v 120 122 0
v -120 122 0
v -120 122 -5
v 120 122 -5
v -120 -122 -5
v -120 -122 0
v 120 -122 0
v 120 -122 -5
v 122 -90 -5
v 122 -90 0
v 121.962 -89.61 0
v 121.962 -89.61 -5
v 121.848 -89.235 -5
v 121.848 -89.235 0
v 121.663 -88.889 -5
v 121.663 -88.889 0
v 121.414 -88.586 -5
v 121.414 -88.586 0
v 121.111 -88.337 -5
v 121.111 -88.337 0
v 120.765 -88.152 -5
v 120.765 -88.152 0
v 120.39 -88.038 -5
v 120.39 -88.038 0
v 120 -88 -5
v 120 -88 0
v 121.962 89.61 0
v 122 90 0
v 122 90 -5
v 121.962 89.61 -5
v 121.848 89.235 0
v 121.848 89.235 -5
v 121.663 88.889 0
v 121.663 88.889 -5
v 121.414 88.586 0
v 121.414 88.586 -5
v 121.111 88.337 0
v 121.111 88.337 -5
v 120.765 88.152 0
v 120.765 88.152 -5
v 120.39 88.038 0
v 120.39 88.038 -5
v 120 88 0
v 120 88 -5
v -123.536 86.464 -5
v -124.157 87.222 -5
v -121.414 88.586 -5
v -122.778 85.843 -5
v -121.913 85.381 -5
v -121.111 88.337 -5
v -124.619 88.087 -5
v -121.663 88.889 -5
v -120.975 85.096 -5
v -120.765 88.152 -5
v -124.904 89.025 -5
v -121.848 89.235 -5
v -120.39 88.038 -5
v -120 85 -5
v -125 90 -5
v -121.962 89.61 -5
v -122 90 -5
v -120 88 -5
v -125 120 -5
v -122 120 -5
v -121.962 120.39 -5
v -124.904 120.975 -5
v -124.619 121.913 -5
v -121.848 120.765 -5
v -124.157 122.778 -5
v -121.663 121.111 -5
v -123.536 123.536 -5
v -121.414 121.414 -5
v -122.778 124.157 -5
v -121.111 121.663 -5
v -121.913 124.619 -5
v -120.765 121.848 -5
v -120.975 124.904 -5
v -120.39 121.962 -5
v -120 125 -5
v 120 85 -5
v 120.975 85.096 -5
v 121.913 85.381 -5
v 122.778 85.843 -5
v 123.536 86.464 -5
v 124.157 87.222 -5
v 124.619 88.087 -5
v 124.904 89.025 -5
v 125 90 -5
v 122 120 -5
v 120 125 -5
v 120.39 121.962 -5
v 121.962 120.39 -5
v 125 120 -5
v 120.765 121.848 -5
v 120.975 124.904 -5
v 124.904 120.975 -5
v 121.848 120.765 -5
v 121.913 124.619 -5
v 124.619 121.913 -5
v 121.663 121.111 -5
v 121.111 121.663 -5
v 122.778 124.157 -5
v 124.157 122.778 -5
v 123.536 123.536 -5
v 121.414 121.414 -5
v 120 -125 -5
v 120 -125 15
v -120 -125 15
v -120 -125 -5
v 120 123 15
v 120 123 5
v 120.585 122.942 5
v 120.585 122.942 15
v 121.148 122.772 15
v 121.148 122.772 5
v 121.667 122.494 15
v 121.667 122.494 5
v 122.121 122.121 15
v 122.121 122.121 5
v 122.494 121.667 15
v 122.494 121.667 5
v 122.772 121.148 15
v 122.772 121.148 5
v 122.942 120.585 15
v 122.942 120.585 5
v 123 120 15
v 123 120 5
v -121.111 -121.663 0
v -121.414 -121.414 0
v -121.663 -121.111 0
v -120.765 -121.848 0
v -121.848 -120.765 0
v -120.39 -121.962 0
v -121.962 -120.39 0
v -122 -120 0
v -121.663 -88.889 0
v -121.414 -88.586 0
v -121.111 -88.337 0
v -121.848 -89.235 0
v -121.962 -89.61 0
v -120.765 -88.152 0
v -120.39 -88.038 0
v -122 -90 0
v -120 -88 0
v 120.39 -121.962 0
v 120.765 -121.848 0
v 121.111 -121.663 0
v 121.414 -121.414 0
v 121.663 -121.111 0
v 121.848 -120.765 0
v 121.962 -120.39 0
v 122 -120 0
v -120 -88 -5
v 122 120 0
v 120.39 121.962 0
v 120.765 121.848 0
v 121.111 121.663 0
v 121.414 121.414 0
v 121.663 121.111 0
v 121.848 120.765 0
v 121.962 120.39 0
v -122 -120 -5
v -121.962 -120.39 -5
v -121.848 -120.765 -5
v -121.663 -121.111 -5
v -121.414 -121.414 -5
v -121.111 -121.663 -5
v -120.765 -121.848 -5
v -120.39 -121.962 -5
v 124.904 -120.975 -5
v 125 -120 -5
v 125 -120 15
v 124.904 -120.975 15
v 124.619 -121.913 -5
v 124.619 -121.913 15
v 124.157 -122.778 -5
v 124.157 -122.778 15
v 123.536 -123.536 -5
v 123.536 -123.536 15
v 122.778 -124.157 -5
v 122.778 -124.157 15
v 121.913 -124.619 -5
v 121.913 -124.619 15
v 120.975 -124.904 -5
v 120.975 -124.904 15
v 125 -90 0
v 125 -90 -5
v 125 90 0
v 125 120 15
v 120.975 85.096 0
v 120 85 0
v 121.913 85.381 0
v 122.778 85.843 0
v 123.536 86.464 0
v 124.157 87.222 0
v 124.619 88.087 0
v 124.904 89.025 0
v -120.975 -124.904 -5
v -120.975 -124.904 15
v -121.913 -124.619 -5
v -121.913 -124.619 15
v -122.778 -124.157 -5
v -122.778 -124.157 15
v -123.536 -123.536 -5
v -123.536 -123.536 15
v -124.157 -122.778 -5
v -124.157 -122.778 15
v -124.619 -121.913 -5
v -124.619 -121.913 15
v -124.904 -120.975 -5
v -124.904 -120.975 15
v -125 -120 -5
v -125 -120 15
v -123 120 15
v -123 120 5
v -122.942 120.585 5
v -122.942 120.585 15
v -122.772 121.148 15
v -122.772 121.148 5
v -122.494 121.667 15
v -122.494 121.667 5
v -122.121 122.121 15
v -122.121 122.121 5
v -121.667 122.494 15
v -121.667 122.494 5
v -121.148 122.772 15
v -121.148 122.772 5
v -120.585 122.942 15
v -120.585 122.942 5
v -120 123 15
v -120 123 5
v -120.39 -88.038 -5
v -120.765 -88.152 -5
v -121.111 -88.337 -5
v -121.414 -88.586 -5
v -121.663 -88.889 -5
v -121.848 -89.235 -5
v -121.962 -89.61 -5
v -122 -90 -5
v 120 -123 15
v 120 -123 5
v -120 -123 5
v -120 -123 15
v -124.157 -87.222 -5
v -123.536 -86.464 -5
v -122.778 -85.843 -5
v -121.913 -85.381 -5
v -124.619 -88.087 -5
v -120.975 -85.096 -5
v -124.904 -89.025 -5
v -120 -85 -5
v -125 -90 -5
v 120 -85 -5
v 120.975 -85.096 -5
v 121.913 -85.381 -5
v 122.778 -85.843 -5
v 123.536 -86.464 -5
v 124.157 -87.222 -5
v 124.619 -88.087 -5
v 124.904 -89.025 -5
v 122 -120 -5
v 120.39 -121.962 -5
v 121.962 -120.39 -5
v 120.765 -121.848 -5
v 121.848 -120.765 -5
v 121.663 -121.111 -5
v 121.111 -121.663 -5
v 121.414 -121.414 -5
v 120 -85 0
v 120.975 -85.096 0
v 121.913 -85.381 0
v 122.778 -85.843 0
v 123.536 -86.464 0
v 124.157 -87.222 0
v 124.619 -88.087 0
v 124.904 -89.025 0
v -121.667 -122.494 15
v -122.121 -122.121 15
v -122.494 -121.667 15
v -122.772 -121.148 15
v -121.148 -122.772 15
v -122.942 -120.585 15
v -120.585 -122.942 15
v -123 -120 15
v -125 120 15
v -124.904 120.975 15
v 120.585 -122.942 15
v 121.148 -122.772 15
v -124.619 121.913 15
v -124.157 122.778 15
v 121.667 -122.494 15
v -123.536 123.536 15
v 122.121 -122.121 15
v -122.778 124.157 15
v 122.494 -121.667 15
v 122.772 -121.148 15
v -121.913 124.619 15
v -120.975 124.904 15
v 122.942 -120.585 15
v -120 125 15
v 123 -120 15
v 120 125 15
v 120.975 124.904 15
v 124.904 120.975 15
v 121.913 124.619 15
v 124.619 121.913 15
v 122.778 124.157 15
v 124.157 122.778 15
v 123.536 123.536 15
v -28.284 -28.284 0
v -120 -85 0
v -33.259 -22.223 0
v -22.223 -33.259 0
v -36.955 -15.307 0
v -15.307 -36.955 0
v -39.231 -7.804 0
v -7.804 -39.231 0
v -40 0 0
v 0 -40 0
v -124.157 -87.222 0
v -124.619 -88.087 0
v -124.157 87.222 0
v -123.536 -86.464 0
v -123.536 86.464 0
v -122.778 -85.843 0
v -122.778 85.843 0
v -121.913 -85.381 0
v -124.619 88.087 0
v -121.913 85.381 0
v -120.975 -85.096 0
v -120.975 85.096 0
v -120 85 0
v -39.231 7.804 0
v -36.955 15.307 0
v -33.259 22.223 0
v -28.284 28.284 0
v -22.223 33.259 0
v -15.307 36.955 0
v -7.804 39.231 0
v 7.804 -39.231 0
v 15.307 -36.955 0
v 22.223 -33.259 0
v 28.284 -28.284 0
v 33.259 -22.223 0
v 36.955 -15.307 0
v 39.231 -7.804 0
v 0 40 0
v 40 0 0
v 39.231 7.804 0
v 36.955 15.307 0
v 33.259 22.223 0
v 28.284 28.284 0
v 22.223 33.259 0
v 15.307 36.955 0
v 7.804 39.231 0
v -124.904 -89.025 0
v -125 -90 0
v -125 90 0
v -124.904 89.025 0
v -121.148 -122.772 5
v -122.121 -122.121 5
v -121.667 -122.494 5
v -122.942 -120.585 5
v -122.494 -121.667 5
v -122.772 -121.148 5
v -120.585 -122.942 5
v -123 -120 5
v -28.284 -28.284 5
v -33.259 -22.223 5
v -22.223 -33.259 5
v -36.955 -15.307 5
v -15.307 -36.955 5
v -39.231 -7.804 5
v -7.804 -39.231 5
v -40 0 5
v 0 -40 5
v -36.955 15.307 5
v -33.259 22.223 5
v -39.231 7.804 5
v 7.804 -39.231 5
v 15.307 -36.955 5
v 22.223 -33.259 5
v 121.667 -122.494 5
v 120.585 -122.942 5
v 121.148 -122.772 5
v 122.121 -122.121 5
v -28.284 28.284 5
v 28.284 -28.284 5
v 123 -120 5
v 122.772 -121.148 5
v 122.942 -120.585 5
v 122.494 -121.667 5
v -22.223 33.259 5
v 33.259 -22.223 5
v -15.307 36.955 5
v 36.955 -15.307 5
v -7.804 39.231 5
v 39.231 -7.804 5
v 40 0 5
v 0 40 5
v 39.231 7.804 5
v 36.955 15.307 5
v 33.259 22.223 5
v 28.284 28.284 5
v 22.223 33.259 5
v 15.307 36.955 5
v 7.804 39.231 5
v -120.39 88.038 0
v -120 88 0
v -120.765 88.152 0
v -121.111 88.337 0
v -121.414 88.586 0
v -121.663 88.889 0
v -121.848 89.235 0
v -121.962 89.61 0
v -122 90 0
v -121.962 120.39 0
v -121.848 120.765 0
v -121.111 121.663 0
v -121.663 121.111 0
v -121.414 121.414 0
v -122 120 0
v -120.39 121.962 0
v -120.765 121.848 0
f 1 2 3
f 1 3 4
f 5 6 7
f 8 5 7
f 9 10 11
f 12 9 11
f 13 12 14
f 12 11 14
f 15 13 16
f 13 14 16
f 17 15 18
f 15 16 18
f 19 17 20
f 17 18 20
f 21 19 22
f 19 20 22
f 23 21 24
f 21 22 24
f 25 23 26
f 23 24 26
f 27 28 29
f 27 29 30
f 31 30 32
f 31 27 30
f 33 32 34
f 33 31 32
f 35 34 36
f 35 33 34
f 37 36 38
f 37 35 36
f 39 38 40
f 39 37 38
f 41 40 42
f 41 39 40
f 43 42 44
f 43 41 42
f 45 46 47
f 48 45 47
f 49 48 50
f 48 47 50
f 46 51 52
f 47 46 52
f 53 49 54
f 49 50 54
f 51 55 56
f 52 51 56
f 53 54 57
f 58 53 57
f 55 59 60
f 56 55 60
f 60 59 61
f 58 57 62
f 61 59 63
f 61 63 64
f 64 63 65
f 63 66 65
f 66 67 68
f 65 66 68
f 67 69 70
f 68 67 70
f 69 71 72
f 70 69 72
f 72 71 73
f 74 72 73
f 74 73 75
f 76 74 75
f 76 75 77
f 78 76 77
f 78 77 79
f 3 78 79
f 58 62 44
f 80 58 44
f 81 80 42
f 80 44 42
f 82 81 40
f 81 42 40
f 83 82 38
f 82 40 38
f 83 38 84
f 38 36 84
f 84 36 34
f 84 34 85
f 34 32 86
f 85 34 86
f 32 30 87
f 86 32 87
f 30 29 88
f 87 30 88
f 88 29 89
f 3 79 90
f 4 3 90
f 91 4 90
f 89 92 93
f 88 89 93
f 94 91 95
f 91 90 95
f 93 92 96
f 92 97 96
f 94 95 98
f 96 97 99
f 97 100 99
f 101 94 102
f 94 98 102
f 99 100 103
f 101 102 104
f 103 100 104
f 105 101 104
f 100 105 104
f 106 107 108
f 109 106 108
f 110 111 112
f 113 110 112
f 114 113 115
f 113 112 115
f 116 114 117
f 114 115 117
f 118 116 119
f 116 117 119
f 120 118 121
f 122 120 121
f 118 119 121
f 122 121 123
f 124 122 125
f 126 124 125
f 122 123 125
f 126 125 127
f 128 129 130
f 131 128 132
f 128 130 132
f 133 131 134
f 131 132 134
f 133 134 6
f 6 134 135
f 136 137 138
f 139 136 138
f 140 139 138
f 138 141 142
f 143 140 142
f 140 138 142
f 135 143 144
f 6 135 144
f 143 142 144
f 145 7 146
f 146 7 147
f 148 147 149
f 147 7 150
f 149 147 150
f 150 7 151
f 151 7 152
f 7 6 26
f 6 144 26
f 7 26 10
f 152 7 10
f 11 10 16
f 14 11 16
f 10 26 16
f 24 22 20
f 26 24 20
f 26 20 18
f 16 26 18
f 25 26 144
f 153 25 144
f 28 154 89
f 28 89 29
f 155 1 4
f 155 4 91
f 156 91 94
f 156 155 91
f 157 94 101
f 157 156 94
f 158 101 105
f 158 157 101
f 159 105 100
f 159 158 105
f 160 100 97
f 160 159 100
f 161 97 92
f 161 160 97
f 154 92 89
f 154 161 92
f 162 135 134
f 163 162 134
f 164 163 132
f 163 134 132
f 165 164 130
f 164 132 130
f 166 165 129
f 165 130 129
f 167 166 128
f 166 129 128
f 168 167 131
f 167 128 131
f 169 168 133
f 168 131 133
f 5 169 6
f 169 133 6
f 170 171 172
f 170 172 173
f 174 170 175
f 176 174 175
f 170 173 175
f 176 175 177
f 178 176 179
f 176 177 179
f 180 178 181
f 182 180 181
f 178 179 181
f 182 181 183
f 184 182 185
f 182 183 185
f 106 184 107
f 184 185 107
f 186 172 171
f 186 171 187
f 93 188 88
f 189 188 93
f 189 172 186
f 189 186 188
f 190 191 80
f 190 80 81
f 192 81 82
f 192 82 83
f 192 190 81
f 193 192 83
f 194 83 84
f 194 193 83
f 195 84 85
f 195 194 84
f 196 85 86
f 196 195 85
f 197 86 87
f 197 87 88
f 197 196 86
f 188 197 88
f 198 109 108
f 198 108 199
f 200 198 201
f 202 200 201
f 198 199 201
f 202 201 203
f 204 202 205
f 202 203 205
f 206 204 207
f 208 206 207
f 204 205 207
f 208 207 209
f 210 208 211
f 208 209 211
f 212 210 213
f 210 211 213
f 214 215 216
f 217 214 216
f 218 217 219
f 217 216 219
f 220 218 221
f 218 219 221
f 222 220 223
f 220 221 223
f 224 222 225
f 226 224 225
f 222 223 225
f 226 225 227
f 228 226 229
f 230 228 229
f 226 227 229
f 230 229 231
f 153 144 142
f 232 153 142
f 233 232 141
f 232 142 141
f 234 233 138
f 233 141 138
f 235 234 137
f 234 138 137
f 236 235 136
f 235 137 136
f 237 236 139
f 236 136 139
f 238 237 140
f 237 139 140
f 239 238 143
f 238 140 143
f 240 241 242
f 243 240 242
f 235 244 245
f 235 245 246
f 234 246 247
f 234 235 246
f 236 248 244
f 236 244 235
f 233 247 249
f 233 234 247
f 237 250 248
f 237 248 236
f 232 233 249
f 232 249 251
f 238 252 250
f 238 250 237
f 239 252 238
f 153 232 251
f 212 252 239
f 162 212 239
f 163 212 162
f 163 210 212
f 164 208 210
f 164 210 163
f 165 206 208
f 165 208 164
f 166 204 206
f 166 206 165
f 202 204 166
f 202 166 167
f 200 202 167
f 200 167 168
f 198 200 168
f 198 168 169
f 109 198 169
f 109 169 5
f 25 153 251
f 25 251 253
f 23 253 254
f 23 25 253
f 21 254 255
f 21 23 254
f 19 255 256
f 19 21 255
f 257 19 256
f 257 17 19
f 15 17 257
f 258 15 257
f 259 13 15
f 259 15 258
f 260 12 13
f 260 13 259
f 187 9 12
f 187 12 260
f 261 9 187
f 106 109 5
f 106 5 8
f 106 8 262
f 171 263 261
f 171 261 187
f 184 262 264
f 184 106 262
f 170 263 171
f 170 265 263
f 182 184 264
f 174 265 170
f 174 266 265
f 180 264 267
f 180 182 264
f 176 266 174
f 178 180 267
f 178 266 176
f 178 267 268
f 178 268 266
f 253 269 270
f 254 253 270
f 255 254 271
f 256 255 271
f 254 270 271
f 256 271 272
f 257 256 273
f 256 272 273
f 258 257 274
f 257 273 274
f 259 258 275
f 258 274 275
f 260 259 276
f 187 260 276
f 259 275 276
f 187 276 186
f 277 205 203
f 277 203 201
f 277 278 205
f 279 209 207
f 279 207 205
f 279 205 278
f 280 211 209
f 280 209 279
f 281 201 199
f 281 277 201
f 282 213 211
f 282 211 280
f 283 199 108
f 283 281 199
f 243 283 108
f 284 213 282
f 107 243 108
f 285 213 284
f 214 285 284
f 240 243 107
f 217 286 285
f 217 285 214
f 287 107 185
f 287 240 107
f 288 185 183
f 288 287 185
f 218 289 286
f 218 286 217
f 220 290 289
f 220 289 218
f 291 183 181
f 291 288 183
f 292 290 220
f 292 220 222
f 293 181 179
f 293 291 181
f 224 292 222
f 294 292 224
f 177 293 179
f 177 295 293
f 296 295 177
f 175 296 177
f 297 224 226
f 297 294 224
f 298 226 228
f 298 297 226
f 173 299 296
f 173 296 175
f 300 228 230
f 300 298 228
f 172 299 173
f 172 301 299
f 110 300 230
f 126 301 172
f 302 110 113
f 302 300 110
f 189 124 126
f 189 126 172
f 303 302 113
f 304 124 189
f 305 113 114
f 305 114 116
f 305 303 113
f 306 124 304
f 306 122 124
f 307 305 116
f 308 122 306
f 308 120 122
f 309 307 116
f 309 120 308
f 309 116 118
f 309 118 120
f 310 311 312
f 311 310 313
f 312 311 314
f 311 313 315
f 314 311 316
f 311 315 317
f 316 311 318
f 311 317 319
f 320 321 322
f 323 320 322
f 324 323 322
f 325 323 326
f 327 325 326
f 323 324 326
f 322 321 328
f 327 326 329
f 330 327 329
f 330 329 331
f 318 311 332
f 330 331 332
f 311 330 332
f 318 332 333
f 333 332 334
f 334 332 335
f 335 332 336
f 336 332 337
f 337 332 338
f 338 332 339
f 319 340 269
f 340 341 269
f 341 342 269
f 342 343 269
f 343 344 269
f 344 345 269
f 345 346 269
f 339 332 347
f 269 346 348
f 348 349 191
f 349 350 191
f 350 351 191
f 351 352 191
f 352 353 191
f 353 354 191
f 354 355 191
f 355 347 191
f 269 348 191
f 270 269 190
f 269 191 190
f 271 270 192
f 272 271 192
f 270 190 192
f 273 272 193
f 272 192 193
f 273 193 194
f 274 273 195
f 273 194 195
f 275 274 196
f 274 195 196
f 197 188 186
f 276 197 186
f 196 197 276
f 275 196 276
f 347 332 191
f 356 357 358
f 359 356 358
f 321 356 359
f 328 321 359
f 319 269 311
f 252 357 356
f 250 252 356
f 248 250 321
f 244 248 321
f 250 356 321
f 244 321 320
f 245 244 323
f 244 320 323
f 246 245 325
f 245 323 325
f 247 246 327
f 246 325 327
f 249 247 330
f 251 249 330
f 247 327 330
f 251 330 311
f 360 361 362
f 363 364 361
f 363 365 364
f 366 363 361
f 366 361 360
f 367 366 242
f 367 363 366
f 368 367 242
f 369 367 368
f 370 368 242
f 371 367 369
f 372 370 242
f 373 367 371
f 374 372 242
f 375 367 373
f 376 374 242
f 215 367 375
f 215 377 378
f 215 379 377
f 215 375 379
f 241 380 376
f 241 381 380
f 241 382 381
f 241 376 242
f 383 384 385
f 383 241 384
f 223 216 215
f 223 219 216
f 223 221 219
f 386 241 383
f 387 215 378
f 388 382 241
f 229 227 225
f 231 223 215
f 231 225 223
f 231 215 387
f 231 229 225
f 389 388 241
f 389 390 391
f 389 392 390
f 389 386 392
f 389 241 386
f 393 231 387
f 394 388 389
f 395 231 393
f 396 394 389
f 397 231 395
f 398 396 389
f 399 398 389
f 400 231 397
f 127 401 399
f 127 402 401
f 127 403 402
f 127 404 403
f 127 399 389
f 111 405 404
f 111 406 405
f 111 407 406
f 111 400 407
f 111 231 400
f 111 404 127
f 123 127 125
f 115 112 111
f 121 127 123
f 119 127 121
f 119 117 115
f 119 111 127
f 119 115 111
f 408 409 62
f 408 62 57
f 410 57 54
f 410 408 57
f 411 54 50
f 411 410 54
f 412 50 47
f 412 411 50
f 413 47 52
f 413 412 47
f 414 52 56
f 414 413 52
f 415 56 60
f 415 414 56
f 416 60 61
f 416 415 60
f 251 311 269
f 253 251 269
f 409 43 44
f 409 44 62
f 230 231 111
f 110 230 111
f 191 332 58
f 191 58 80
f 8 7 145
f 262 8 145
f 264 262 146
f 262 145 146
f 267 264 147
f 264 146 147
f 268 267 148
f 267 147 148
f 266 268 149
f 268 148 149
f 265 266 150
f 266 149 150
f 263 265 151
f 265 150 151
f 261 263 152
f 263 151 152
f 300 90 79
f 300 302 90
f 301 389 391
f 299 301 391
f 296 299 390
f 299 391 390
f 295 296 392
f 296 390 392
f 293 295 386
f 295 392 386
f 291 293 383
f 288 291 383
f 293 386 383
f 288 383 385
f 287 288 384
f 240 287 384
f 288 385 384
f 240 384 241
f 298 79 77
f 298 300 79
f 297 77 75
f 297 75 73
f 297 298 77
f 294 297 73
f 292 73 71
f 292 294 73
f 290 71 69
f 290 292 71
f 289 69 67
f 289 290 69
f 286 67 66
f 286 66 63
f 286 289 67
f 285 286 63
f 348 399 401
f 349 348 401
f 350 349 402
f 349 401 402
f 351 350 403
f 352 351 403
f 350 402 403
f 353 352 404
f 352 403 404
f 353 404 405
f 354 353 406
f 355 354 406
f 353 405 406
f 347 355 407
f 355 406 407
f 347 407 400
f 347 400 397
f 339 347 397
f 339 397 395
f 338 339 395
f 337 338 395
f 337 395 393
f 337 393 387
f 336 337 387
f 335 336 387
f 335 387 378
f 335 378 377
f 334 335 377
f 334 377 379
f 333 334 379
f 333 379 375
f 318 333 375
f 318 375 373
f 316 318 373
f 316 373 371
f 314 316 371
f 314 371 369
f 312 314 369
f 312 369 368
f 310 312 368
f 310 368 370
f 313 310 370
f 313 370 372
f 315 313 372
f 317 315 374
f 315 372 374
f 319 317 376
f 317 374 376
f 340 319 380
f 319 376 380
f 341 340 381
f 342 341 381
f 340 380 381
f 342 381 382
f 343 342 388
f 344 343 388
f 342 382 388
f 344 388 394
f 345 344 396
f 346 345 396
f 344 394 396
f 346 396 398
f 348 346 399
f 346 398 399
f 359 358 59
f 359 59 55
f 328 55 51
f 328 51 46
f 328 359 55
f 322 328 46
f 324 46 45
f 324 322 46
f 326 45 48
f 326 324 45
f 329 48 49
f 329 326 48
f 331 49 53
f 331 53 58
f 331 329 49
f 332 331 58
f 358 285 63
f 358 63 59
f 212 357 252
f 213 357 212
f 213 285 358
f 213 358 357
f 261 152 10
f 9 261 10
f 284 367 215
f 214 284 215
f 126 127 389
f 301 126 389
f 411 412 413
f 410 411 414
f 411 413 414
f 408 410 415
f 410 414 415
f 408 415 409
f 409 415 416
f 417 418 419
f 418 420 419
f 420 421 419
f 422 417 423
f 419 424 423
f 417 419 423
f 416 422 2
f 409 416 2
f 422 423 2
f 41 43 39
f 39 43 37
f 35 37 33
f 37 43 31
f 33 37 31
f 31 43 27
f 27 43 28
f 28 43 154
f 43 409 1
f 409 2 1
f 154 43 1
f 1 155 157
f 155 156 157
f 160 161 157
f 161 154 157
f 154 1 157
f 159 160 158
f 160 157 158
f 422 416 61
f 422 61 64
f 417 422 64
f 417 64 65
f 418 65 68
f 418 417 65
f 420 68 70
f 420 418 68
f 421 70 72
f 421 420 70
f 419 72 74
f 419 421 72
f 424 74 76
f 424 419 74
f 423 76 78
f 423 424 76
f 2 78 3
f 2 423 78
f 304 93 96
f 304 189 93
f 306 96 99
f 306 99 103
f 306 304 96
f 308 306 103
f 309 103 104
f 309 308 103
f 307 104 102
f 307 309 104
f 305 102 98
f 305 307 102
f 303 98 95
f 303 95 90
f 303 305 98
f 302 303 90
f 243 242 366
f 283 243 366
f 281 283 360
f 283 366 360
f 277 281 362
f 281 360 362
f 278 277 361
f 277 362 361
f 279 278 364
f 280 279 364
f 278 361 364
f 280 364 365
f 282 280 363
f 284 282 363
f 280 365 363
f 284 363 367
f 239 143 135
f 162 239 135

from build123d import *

# Parameters (mm, degrees)
F1_DEPTH = 5
F3_DEPTH = 10
F4_R     = 40
F5_DEPTH = 5.001
F7_DEPTH = 5


# Not quite as in the source:
# - a pattern or mirror of a feature is missing from the dataset's text; its kind, count and spacing are read off the source's solid


with BuildPart() as f1:
    # F0 (on Top) → F1 (new body)
    with BuildSketch(Plane.XY):
        with BuildLine():
            ThreePointArc((125, 120), (123.5355339059, 123.5355339059), (120, 125))
            Line((120, 125), (-120, 125))
            ThreePointArc((-120, 125), (-123.5355339059, 123.5355339059), (-125, 120))
            Line((-125, 120), (-125, -120))
            ThreePointArc((-125, -120), (-123.5355339059, -123.5355339059), (-120, -125))
            Line((-120, -125), (120, -125))
            ThreePointArc((120, -125), (123.5355339059, -123.5355339059), (125, -120))
            Line((125, -120), (125, 120))
        make_face()
    extrude(amount=F1_DEPTH)

    # F2 (on face) → F3 (join)
    with BuildSketch(Plane.XY.offset(5)):
        with BuildLine():
            ThreePointArc((-120, 125), (-123.5355339059, 123.5355339059), (-125, 120))
            Line((-125, 120), (-125, -120))
            ThreePointArc((-125, -120), (-123.5355339059, -123.5355339059), (-120, -125))
            Line((-120, -125), (120, -125))
            ThreePointArc((120, -125), (123.5355339059, -123.5355339059), (125, -120))
            Line((125, -120), (125, 120))
            ThreePointArc((125, 120), (123.5355339059, 123.5355339059), (120, 125))
            Line((120, 125), (-120, 125))
        make_face()
        with BuildLine():
            Line((-120, 123), (120, 123))
            ThreePointArc((120, 123), (122.1213203436, 122.1213203436), (123, 120))
            Line((123, 120), (123, -120))
            ThreePointArc((123, -120), (122.1213203436, -122.1213203436), (120, -123))
            Line((120, -123), (-120, -123))
            ThreePointArc((-120, -123), (-122.1213203436, -122.1213203436), (-123, -120))
            Line((-123, -120), (-123, 120))
            ThreePointArc((-123, 120), (-122.1213203436, 122.1213203436), (-120, 123))
        make_face(mode=Mode.SUBTRACT)
    extrude(amount=F3_DEPTH)

    # F4 (on face) → F5 (cut, through all)
    with BuildSketch(Plane.XY.offset(5)):
        Circle(F4_R)
    extrude(amount=-F5_DEPTH, mode=Mode.SUBTRACT)

    # F6 (on face) → F7 (join)
    with BuildSketch(Plane(origin=(0, 0, 0), x_dir=(1, 0, 0), z_dir=(0, 0, -1))):
        with BuildLine():
            ThreePointArc((-120, 125), (-123.5355339059, 123.5355339059), (-125, 120))
            Line((-125, 120), (-125, 90))
            ThreePointArc((-125, 90), (-123.5355339059, 86.4644660941), (-120, 85))
            Line((-120, 85), (120, 85))
            ThreePointArc((120, 85), (123.5355339059, 86.4644660941), (125, 90))
            Line((125, 90), (125, 120))
            ThreePointArc((125, 120), (123.5355339059, 123.5355339059), (120, 125))
            Line((120, 125), (-120, 125))
        make_face()
        with BuildLine():
            Line((-122, 90), (-122, 120))
            ThreePointArc((-122, 120), (-121.4142135624, 121.4142135624), (-120, 122))
            Line((-120, 122), (120, 122))
            ThreePointArc((120, 122), (121.4142135624, 121.4142135624), (122, 120))
            Line((122, 120), (122, 90))
            ThreePointArc((122, 90), (121.4142135624, 88.5857864376), (120, 88))
            Line((120, 88), (-120, 88))
            ThreePointArc((-120, 88), (-121.4142135624, 88.5857864376), (-122, 90))
        make_face(mode=Mode.SUBTRACT)
    f7 = extrude(amount=F7_DEPTH)

    # F7_copies: F7 across plane
    add(f7.mirror(Plane.ZX))


solid = f1.part
